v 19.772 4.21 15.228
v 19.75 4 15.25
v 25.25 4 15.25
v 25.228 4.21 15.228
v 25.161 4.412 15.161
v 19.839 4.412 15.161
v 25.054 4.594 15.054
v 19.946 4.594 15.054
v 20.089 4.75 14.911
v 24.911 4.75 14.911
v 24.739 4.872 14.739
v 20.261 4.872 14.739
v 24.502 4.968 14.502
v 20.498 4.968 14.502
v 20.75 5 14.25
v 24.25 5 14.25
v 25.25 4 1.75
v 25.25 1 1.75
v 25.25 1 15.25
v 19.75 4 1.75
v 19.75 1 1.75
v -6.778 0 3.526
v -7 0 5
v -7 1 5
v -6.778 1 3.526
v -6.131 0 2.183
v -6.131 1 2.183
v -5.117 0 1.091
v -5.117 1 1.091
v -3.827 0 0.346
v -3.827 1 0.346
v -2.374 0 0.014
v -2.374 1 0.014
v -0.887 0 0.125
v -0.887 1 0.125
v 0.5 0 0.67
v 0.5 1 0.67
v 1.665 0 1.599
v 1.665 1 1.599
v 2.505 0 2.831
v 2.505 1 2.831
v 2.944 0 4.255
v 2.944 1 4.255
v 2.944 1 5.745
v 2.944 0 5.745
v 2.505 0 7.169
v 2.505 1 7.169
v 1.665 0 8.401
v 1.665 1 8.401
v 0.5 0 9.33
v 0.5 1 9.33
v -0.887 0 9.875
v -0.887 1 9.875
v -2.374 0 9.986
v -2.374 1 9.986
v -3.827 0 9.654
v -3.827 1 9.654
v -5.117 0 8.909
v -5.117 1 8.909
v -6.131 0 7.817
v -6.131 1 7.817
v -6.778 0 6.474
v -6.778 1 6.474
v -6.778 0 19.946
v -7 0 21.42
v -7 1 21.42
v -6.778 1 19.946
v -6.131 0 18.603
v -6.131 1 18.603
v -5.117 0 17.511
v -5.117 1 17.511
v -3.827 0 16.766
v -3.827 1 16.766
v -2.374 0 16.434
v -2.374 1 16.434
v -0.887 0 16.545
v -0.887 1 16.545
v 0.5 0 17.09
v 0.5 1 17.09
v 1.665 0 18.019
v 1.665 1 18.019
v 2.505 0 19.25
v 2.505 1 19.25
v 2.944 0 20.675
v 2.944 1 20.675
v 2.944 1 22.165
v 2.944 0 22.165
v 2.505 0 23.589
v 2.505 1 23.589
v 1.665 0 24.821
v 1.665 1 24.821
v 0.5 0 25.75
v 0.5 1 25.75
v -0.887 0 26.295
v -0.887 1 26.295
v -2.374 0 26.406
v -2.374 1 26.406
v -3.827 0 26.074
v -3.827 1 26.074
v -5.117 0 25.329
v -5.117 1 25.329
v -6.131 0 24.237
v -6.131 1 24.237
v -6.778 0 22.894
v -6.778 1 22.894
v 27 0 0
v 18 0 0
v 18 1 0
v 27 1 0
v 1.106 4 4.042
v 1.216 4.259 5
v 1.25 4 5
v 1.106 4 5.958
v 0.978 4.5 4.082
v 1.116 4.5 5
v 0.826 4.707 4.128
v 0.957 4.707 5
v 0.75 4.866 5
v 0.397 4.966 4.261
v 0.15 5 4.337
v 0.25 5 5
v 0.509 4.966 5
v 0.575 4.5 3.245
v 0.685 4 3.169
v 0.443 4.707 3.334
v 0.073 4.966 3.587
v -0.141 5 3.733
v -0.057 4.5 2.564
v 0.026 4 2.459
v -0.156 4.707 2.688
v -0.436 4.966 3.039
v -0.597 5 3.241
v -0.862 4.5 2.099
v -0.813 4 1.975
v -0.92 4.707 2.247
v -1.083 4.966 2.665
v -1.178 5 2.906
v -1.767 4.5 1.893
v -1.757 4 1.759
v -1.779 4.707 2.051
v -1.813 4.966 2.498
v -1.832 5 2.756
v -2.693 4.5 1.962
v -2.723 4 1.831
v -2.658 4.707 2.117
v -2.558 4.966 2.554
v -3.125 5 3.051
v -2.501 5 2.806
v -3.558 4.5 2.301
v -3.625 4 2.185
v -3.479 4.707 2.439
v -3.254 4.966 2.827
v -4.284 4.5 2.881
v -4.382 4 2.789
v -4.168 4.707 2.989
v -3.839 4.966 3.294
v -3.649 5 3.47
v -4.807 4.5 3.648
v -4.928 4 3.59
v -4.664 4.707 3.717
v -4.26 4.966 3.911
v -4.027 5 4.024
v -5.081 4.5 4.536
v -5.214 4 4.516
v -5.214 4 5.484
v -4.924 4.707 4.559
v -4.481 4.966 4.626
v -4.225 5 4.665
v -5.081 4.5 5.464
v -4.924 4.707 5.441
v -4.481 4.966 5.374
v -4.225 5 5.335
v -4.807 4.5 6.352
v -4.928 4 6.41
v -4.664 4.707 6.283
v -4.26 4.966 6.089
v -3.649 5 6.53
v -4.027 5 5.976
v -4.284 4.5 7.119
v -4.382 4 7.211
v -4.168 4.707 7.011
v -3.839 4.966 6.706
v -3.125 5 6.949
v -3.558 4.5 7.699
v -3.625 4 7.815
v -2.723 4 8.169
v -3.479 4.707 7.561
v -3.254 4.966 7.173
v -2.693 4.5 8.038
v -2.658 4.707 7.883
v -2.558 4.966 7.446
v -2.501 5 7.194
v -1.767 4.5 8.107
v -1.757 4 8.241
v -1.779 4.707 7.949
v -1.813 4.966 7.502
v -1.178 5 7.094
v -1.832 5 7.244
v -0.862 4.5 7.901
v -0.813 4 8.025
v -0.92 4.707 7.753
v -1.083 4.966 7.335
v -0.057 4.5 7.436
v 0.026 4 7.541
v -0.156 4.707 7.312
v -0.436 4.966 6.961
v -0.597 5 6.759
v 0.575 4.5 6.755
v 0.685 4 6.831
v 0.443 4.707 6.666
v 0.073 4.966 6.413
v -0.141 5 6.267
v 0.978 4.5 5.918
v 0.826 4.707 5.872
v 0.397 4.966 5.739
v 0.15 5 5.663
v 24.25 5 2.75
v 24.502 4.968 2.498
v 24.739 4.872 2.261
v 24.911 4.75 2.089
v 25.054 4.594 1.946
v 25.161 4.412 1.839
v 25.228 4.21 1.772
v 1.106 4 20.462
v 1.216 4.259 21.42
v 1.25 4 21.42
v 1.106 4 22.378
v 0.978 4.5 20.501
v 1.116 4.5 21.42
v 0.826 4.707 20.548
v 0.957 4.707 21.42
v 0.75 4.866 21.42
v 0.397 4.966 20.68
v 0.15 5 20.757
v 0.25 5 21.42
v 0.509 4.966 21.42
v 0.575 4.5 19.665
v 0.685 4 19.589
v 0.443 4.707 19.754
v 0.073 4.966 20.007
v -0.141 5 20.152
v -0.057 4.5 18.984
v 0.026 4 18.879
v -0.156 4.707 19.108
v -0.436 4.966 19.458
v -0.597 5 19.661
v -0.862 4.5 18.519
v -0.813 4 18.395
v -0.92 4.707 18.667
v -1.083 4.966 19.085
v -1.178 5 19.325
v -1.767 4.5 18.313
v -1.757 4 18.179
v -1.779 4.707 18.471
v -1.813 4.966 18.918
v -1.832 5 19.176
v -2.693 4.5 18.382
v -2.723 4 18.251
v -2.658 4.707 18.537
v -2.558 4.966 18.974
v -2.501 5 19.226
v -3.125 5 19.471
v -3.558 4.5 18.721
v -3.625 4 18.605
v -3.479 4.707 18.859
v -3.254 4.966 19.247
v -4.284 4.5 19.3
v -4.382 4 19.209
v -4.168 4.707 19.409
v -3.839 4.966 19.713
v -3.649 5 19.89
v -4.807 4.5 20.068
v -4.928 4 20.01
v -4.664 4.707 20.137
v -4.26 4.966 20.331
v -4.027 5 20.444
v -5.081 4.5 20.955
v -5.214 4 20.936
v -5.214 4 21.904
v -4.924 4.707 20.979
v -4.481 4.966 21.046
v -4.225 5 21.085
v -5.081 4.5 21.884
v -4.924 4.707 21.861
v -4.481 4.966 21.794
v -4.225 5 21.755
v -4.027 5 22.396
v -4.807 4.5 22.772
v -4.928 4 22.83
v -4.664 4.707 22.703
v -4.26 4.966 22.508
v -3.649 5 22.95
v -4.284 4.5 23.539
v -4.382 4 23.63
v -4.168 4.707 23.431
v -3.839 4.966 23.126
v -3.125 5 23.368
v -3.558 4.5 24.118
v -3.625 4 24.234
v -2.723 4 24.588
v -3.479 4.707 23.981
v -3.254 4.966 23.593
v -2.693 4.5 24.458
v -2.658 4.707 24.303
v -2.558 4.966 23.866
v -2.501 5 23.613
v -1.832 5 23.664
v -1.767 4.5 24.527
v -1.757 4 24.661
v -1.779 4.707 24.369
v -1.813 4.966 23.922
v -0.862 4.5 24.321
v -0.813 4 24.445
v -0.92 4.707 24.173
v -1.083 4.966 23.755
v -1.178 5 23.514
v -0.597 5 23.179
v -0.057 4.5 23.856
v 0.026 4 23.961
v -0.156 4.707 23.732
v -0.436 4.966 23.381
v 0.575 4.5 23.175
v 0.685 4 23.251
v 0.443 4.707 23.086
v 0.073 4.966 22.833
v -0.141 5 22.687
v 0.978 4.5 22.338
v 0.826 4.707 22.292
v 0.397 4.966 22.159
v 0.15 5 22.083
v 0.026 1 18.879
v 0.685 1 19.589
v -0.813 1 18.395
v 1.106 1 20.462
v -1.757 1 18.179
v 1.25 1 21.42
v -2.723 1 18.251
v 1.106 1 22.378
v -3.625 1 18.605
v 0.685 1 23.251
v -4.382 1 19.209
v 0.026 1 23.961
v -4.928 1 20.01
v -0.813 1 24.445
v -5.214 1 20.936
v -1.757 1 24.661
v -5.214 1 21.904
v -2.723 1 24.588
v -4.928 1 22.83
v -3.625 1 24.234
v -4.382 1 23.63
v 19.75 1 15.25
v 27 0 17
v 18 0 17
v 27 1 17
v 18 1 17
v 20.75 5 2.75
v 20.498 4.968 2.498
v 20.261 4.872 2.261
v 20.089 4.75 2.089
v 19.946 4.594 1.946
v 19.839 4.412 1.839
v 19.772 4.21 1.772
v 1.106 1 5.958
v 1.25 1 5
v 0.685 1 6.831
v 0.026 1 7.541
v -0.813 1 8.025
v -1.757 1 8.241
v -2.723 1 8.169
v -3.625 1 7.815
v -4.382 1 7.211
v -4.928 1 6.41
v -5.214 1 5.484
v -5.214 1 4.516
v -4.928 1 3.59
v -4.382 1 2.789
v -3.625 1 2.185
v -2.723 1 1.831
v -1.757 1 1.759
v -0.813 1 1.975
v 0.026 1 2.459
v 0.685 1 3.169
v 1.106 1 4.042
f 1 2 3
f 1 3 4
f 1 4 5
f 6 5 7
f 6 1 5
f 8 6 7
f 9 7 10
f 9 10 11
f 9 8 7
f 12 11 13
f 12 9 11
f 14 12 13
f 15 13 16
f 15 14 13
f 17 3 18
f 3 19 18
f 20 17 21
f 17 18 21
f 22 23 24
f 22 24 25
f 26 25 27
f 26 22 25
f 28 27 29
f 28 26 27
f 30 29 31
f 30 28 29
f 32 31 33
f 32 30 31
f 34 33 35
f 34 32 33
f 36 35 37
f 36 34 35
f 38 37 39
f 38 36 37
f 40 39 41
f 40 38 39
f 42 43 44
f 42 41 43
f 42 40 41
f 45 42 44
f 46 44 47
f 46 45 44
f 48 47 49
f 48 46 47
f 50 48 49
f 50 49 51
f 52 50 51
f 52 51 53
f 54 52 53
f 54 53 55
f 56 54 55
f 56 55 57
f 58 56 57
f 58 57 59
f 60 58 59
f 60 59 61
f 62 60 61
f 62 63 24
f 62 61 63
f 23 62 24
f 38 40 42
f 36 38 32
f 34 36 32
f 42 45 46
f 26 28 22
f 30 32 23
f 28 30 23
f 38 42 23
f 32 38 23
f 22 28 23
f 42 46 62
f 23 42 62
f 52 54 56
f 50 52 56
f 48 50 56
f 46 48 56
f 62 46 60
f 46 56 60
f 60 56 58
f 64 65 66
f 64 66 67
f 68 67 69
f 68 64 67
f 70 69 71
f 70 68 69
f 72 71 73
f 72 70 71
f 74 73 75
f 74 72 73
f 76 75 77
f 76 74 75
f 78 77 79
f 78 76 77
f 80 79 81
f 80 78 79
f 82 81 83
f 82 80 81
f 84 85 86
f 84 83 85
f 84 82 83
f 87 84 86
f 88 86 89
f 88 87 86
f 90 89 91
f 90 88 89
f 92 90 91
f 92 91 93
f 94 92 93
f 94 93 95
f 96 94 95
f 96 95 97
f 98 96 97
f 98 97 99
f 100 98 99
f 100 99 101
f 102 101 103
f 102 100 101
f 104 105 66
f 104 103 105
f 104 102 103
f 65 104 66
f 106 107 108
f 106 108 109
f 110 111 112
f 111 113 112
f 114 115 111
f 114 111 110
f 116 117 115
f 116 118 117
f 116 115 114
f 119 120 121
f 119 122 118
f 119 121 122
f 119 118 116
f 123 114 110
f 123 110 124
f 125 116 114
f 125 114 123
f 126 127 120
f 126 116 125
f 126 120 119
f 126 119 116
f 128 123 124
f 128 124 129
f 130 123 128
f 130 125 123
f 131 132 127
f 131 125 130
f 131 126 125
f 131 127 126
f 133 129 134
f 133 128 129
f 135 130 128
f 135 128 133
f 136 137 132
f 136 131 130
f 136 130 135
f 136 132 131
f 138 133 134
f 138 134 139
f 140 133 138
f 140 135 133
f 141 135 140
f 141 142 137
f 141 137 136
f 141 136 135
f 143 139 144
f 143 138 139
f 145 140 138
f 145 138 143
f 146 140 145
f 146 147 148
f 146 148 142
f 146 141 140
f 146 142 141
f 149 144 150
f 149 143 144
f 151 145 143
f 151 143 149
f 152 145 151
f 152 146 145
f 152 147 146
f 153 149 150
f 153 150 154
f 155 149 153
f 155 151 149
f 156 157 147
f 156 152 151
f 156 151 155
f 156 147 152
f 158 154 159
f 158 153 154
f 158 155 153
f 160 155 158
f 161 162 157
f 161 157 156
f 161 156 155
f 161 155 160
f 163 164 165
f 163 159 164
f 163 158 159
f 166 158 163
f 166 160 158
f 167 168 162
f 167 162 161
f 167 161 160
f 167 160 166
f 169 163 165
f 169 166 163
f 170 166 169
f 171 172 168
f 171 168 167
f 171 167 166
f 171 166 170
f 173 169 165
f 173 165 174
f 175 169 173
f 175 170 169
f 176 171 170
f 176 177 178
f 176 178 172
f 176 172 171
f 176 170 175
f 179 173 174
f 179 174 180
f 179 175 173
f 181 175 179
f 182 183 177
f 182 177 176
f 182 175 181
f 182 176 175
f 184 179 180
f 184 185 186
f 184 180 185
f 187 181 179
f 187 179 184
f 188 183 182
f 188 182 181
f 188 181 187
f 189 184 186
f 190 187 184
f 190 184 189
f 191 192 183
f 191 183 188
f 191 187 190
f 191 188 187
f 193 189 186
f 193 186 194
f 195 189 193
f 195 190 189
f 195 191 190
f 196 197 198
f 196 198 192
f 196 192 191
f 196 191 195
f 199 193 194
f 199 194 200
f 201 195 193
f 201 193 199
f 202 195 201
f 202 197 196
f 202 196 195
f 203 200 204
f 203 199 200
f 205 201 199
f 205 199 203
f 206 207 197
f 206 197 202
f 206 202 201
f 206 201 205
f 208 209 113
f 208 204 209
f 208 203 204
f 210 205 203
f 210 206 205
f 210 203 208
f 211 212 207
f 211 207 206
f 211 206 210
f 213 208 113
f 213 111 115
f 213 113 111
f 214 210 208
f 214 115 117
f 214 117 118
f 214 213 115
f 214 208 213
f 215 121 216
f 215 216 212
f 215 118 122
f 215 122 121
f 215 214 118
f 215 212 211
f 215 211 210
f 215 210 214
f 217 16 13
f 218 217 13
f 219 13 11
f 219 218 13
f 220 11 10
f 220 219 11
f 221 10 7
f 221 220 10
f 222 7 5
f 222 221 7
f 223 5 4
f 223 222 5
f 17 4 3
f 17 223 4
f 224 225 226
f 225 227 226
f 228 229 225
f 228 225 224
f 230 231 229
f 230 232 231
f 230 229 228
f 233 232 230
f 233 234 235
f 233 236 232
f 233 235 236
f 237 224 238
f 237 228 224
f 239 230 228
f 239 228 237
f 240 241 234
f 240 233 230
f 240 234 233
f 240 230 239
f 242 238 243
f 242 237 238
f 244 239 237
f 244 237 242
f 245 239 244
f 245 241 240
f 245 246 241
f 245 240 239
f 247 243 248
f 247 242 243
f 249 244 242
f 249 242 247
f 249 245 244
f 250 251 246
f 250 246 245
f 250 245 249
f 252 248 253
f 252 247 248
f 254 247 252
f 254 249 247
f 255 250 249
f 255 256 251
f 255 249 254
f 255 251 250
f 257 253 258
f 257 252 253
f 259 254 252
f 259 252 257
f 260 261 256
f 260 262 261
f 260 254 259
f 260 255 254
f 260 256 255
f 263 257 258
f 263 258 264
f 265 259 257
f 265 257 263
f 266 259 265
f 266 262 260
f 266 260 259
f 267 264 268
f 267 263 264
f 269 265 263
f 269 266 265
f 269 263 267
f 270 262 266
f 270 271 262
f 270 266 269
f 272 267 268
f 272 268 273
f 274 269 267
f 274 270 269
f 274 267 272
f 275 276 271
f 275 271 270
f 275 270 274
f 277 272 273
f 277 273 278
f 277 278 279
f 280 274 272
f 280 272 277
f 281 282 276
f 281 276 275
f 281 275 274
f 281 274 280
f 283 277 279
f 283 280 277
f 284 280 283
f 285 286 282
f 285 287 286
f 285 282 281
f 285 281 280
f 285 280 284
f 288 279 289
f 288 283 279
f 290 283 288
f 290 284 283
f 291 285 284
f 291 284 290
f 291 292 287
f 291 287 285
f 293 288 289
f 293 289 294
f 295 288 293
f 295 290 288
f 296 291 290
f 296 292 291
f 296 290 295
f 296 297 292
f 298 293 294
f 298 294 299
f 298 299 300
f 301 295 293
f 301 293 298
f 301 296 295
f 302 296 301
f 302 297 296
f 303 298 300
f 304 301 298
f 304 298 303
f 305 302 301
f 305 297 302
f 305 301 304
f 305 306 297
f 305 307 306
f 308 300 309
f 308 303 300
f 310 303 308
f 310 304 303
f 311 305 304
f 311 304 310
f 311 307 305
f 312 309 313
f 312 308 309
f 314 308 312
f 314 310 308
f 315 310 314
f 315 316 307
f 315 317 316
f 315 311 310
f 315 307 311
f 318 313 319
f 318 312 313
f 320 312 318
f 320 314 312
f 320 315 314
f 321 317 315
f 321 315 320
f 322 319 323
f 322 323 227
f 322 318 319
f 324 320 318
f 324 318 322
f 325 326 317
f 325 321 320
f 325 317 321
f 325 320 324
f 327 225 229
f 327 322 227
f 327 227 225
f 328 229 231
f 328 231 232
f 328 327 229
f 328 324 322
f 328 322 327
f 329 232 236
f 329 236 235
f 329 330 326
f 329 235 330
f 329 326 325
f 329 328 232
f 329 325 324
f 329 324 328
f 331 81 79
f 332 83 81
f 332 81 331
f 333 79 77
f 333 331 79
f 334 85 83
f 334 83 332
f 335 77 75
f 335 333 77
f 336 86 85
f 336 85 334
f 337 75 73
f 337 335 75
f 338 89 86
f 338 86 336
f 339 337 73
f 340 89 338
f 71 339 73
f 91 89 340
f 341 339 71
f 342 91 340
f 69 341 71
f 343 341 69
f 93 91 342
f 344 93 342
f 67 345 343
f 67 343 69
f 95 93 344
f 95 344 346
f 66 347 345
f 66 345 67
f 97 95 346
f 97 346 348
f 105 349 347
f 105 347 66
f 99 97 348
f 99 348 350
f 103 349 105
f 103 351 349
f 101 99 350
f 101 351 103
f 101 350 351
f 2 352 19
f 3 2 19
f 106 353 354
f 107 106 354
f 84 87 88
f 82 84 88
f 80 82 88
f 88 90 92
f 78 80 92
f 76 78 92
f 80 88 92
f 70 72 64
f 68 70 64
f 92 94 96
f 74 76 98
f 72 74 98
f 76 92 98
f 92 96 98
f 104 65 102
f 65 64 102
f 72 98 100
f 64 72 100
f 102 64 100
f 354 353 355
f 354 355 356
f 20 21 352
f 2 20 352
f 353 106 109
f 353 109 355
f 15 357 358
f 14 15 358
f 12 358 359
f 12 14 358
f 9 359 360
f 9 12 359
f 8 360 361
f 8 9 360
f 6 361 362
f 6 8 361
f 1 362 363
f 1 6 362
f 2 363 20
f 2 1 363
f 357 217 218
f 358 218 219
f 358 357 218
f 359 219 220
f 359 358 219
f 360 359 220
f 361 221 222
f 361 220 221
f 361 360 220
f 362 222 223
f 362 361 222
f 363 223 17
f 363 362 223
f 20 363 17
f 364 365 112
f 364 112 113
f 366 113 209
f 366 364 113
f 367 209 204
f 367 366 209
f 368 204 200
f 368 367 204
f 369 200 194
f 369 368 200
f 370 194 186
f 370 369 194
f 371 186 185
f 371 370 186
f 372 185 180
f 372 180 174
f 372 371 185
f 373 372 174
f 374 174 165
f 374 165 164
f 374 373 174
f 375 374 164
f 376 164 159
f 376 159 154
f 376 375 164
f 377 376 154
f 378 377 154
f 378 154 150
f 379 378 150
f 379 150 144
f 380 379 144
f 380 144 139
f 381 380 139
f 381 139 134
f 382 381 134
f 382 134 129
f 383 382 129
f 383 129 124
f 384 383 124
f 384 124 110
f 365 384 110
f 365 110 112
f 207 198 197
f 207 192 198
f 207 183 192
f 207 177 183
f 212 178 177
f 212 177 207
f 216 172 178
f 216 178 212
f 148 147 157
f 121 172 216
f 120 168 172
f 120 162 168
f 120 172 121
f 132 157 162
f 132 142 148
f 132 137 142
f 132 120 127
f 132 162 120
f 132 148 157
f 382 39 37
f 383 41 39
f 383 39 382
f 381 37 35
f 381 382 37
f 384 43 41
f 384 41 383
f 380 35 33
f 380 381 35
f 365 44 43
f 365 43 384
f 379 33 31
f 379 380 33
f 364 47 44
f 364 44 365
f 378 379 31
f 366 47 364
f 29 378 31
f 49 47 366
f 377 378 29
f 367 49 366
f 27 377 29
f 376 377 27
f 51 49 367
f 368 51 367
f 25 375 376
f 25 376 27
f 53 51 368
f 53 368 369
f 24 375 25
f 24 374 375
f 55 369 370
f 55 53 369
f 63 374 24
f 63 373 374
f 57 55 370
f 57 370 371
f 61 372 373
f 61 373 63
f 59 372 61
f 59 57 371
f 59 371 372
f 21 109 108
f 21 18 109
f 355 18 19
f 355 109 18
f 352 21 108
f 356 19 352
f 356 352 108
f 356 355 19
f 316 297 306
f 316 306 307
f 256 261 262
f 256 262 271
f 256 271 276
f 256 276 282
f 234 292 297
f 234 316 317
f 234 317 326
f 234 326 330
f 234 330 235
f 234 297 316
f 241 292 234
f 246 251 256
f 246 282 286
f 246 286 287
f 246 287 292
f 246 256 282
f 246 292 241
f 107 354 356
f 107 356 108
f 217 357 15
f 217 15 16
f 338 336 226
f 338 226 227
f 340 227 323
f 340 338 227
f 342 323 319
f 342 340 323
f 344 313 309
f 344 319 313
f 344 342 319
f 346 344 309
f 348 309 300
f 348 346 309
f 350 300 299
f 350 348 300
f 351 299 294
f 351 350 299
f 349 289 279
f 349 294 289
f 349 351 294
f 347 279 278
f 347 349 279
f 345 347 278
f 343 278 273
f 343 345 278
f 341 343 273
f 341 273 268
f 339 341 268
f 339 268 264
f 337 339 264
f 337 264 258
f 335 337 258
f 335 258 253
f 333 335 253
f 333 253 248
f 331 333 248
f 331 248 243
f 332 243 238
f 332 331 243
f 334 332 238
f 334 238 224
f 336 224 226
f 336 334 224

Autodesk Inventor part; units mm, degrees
ref_plane "YZ Plane" through (0, 0, 0) normal (1, 0, 0) x (0, 1, 0)
ref_plane "XZ Plane" through (0, 0, 0) normal (0, 1, 0) x (-1, 0, 0)
ref_plane "XY Plane" through (0, 0, 0) normal (0, 0, 1) x (1, 0, 0)
sketch "Эскиз1" plane through (0, 0, 0) normal (0, 1, 0) x (-1, 0, 0)
  circle A0 centre (2, 5) radius 5
  circle A1 centre (2, 21.4199) radius 5
  line L0 (-18, 0) -> (-27, 0)
  line L1 (-27, 0) -> (-27, 17)
  line L2 (-27, 17) -> (-18, 17)
  line L3 (-18, 17) -> (-18, 0)
  point P0 (0, 0)
  dimension "d0" = 10
  dimension "d1" = 10
  dimension "d2" = 9
  dimension "d3" = 17
extrude "Выдавливание1" add sketch "Эскиз1" along normal blind 1
sketch "Эскиз2" plane through (-2, 1, 21.4199) normal (0, 1, 0) x (1, 0, 0)
  circle A0 centre (0, 0) radius 5 projected
  circle A1 centre (0, 0) radius 3.25
  circle A2 centre (0, 16.4199) radius 5 projected
  line L0 (0, 11.4199) -> (0, 21.4199)
  circle A3 centre (0, 16.4199) radius 3.25
  line L1 (20, 4.4199) -> (29, 4.4199) projected
  line L2 (24.5, 4.4199) -> (24.5, 21.4199)
  line L3 (29, 21.4199) -> (20, 21.4199) projected
  line L4 (21.75, 6.1699) -> (27.25, 6.1699)
  line L5 (27.25, 6.1699) -> (27.25, 19.6699)
  line L6 (27.25, 19.6699) -> (21.75, 19.6699)
  line L7 (21.75, 19.6699) -> (21.75, 6.1699)
  line L8 (21.75, 6.1699) -> (27.25, 19.6699) construction
  line L9 (27.25, 6.1699) -> (21.75, 19.6699) construction
  point P0 (2, 21.4199)
  point P1 (24.5, 12.9199)
  dimension "d6" = 6.5
  dimension "d7" = 6.5
  dimension "d8" = 5.5
  dimension "d9" = 13.5
extrude "Выдавливание2" add sketch "Эскиз2" along normal blind 4 contours A1 | A3 L0 | L0 A3 | L4 L7 L6 L2 | L2 L6 L5 L4
fillet "Сопряжение1" radius 1 6 edges at (-5.25, 5, 5) (-5.25, 5, 21.4199) (25.25, 5, 8.5) (22.5, 5, 15.25) (19.75, 5, 8.5) (22.5, 5, 1.75)
sketch "Эскиз3" plane through (-2, 5, 21.4199) normal (0, 1, 0) x (1, 0, 0)
  line L0 (22.75, 7.1699) -> (22.75, 18.6699) projected
  line L1 (26.25, 7.1699) -> (22.75, 7.1699) projected
  line L2 (26.25, 18.6699) -> (26.25, 7.1699) projected
  line L3 (22.75, 18.6699) -> (26.25, 18.6699) projected
  line L4 (23.0928, 7.1539) -> (23.0928, 18.4151) construction
  line L5 (23.0928, 18.4151) -> (25.6461, 18.4151) construction
  line L6 (25.6461, 18.4151) -> (25.6461, 7.1539) construction
  line L7 (25.6461, 7.1539) -> (23.0928, 7.1539) construction
  point P0 (2, 21.4199)
properties part number "ESP_DISP_BUT"
